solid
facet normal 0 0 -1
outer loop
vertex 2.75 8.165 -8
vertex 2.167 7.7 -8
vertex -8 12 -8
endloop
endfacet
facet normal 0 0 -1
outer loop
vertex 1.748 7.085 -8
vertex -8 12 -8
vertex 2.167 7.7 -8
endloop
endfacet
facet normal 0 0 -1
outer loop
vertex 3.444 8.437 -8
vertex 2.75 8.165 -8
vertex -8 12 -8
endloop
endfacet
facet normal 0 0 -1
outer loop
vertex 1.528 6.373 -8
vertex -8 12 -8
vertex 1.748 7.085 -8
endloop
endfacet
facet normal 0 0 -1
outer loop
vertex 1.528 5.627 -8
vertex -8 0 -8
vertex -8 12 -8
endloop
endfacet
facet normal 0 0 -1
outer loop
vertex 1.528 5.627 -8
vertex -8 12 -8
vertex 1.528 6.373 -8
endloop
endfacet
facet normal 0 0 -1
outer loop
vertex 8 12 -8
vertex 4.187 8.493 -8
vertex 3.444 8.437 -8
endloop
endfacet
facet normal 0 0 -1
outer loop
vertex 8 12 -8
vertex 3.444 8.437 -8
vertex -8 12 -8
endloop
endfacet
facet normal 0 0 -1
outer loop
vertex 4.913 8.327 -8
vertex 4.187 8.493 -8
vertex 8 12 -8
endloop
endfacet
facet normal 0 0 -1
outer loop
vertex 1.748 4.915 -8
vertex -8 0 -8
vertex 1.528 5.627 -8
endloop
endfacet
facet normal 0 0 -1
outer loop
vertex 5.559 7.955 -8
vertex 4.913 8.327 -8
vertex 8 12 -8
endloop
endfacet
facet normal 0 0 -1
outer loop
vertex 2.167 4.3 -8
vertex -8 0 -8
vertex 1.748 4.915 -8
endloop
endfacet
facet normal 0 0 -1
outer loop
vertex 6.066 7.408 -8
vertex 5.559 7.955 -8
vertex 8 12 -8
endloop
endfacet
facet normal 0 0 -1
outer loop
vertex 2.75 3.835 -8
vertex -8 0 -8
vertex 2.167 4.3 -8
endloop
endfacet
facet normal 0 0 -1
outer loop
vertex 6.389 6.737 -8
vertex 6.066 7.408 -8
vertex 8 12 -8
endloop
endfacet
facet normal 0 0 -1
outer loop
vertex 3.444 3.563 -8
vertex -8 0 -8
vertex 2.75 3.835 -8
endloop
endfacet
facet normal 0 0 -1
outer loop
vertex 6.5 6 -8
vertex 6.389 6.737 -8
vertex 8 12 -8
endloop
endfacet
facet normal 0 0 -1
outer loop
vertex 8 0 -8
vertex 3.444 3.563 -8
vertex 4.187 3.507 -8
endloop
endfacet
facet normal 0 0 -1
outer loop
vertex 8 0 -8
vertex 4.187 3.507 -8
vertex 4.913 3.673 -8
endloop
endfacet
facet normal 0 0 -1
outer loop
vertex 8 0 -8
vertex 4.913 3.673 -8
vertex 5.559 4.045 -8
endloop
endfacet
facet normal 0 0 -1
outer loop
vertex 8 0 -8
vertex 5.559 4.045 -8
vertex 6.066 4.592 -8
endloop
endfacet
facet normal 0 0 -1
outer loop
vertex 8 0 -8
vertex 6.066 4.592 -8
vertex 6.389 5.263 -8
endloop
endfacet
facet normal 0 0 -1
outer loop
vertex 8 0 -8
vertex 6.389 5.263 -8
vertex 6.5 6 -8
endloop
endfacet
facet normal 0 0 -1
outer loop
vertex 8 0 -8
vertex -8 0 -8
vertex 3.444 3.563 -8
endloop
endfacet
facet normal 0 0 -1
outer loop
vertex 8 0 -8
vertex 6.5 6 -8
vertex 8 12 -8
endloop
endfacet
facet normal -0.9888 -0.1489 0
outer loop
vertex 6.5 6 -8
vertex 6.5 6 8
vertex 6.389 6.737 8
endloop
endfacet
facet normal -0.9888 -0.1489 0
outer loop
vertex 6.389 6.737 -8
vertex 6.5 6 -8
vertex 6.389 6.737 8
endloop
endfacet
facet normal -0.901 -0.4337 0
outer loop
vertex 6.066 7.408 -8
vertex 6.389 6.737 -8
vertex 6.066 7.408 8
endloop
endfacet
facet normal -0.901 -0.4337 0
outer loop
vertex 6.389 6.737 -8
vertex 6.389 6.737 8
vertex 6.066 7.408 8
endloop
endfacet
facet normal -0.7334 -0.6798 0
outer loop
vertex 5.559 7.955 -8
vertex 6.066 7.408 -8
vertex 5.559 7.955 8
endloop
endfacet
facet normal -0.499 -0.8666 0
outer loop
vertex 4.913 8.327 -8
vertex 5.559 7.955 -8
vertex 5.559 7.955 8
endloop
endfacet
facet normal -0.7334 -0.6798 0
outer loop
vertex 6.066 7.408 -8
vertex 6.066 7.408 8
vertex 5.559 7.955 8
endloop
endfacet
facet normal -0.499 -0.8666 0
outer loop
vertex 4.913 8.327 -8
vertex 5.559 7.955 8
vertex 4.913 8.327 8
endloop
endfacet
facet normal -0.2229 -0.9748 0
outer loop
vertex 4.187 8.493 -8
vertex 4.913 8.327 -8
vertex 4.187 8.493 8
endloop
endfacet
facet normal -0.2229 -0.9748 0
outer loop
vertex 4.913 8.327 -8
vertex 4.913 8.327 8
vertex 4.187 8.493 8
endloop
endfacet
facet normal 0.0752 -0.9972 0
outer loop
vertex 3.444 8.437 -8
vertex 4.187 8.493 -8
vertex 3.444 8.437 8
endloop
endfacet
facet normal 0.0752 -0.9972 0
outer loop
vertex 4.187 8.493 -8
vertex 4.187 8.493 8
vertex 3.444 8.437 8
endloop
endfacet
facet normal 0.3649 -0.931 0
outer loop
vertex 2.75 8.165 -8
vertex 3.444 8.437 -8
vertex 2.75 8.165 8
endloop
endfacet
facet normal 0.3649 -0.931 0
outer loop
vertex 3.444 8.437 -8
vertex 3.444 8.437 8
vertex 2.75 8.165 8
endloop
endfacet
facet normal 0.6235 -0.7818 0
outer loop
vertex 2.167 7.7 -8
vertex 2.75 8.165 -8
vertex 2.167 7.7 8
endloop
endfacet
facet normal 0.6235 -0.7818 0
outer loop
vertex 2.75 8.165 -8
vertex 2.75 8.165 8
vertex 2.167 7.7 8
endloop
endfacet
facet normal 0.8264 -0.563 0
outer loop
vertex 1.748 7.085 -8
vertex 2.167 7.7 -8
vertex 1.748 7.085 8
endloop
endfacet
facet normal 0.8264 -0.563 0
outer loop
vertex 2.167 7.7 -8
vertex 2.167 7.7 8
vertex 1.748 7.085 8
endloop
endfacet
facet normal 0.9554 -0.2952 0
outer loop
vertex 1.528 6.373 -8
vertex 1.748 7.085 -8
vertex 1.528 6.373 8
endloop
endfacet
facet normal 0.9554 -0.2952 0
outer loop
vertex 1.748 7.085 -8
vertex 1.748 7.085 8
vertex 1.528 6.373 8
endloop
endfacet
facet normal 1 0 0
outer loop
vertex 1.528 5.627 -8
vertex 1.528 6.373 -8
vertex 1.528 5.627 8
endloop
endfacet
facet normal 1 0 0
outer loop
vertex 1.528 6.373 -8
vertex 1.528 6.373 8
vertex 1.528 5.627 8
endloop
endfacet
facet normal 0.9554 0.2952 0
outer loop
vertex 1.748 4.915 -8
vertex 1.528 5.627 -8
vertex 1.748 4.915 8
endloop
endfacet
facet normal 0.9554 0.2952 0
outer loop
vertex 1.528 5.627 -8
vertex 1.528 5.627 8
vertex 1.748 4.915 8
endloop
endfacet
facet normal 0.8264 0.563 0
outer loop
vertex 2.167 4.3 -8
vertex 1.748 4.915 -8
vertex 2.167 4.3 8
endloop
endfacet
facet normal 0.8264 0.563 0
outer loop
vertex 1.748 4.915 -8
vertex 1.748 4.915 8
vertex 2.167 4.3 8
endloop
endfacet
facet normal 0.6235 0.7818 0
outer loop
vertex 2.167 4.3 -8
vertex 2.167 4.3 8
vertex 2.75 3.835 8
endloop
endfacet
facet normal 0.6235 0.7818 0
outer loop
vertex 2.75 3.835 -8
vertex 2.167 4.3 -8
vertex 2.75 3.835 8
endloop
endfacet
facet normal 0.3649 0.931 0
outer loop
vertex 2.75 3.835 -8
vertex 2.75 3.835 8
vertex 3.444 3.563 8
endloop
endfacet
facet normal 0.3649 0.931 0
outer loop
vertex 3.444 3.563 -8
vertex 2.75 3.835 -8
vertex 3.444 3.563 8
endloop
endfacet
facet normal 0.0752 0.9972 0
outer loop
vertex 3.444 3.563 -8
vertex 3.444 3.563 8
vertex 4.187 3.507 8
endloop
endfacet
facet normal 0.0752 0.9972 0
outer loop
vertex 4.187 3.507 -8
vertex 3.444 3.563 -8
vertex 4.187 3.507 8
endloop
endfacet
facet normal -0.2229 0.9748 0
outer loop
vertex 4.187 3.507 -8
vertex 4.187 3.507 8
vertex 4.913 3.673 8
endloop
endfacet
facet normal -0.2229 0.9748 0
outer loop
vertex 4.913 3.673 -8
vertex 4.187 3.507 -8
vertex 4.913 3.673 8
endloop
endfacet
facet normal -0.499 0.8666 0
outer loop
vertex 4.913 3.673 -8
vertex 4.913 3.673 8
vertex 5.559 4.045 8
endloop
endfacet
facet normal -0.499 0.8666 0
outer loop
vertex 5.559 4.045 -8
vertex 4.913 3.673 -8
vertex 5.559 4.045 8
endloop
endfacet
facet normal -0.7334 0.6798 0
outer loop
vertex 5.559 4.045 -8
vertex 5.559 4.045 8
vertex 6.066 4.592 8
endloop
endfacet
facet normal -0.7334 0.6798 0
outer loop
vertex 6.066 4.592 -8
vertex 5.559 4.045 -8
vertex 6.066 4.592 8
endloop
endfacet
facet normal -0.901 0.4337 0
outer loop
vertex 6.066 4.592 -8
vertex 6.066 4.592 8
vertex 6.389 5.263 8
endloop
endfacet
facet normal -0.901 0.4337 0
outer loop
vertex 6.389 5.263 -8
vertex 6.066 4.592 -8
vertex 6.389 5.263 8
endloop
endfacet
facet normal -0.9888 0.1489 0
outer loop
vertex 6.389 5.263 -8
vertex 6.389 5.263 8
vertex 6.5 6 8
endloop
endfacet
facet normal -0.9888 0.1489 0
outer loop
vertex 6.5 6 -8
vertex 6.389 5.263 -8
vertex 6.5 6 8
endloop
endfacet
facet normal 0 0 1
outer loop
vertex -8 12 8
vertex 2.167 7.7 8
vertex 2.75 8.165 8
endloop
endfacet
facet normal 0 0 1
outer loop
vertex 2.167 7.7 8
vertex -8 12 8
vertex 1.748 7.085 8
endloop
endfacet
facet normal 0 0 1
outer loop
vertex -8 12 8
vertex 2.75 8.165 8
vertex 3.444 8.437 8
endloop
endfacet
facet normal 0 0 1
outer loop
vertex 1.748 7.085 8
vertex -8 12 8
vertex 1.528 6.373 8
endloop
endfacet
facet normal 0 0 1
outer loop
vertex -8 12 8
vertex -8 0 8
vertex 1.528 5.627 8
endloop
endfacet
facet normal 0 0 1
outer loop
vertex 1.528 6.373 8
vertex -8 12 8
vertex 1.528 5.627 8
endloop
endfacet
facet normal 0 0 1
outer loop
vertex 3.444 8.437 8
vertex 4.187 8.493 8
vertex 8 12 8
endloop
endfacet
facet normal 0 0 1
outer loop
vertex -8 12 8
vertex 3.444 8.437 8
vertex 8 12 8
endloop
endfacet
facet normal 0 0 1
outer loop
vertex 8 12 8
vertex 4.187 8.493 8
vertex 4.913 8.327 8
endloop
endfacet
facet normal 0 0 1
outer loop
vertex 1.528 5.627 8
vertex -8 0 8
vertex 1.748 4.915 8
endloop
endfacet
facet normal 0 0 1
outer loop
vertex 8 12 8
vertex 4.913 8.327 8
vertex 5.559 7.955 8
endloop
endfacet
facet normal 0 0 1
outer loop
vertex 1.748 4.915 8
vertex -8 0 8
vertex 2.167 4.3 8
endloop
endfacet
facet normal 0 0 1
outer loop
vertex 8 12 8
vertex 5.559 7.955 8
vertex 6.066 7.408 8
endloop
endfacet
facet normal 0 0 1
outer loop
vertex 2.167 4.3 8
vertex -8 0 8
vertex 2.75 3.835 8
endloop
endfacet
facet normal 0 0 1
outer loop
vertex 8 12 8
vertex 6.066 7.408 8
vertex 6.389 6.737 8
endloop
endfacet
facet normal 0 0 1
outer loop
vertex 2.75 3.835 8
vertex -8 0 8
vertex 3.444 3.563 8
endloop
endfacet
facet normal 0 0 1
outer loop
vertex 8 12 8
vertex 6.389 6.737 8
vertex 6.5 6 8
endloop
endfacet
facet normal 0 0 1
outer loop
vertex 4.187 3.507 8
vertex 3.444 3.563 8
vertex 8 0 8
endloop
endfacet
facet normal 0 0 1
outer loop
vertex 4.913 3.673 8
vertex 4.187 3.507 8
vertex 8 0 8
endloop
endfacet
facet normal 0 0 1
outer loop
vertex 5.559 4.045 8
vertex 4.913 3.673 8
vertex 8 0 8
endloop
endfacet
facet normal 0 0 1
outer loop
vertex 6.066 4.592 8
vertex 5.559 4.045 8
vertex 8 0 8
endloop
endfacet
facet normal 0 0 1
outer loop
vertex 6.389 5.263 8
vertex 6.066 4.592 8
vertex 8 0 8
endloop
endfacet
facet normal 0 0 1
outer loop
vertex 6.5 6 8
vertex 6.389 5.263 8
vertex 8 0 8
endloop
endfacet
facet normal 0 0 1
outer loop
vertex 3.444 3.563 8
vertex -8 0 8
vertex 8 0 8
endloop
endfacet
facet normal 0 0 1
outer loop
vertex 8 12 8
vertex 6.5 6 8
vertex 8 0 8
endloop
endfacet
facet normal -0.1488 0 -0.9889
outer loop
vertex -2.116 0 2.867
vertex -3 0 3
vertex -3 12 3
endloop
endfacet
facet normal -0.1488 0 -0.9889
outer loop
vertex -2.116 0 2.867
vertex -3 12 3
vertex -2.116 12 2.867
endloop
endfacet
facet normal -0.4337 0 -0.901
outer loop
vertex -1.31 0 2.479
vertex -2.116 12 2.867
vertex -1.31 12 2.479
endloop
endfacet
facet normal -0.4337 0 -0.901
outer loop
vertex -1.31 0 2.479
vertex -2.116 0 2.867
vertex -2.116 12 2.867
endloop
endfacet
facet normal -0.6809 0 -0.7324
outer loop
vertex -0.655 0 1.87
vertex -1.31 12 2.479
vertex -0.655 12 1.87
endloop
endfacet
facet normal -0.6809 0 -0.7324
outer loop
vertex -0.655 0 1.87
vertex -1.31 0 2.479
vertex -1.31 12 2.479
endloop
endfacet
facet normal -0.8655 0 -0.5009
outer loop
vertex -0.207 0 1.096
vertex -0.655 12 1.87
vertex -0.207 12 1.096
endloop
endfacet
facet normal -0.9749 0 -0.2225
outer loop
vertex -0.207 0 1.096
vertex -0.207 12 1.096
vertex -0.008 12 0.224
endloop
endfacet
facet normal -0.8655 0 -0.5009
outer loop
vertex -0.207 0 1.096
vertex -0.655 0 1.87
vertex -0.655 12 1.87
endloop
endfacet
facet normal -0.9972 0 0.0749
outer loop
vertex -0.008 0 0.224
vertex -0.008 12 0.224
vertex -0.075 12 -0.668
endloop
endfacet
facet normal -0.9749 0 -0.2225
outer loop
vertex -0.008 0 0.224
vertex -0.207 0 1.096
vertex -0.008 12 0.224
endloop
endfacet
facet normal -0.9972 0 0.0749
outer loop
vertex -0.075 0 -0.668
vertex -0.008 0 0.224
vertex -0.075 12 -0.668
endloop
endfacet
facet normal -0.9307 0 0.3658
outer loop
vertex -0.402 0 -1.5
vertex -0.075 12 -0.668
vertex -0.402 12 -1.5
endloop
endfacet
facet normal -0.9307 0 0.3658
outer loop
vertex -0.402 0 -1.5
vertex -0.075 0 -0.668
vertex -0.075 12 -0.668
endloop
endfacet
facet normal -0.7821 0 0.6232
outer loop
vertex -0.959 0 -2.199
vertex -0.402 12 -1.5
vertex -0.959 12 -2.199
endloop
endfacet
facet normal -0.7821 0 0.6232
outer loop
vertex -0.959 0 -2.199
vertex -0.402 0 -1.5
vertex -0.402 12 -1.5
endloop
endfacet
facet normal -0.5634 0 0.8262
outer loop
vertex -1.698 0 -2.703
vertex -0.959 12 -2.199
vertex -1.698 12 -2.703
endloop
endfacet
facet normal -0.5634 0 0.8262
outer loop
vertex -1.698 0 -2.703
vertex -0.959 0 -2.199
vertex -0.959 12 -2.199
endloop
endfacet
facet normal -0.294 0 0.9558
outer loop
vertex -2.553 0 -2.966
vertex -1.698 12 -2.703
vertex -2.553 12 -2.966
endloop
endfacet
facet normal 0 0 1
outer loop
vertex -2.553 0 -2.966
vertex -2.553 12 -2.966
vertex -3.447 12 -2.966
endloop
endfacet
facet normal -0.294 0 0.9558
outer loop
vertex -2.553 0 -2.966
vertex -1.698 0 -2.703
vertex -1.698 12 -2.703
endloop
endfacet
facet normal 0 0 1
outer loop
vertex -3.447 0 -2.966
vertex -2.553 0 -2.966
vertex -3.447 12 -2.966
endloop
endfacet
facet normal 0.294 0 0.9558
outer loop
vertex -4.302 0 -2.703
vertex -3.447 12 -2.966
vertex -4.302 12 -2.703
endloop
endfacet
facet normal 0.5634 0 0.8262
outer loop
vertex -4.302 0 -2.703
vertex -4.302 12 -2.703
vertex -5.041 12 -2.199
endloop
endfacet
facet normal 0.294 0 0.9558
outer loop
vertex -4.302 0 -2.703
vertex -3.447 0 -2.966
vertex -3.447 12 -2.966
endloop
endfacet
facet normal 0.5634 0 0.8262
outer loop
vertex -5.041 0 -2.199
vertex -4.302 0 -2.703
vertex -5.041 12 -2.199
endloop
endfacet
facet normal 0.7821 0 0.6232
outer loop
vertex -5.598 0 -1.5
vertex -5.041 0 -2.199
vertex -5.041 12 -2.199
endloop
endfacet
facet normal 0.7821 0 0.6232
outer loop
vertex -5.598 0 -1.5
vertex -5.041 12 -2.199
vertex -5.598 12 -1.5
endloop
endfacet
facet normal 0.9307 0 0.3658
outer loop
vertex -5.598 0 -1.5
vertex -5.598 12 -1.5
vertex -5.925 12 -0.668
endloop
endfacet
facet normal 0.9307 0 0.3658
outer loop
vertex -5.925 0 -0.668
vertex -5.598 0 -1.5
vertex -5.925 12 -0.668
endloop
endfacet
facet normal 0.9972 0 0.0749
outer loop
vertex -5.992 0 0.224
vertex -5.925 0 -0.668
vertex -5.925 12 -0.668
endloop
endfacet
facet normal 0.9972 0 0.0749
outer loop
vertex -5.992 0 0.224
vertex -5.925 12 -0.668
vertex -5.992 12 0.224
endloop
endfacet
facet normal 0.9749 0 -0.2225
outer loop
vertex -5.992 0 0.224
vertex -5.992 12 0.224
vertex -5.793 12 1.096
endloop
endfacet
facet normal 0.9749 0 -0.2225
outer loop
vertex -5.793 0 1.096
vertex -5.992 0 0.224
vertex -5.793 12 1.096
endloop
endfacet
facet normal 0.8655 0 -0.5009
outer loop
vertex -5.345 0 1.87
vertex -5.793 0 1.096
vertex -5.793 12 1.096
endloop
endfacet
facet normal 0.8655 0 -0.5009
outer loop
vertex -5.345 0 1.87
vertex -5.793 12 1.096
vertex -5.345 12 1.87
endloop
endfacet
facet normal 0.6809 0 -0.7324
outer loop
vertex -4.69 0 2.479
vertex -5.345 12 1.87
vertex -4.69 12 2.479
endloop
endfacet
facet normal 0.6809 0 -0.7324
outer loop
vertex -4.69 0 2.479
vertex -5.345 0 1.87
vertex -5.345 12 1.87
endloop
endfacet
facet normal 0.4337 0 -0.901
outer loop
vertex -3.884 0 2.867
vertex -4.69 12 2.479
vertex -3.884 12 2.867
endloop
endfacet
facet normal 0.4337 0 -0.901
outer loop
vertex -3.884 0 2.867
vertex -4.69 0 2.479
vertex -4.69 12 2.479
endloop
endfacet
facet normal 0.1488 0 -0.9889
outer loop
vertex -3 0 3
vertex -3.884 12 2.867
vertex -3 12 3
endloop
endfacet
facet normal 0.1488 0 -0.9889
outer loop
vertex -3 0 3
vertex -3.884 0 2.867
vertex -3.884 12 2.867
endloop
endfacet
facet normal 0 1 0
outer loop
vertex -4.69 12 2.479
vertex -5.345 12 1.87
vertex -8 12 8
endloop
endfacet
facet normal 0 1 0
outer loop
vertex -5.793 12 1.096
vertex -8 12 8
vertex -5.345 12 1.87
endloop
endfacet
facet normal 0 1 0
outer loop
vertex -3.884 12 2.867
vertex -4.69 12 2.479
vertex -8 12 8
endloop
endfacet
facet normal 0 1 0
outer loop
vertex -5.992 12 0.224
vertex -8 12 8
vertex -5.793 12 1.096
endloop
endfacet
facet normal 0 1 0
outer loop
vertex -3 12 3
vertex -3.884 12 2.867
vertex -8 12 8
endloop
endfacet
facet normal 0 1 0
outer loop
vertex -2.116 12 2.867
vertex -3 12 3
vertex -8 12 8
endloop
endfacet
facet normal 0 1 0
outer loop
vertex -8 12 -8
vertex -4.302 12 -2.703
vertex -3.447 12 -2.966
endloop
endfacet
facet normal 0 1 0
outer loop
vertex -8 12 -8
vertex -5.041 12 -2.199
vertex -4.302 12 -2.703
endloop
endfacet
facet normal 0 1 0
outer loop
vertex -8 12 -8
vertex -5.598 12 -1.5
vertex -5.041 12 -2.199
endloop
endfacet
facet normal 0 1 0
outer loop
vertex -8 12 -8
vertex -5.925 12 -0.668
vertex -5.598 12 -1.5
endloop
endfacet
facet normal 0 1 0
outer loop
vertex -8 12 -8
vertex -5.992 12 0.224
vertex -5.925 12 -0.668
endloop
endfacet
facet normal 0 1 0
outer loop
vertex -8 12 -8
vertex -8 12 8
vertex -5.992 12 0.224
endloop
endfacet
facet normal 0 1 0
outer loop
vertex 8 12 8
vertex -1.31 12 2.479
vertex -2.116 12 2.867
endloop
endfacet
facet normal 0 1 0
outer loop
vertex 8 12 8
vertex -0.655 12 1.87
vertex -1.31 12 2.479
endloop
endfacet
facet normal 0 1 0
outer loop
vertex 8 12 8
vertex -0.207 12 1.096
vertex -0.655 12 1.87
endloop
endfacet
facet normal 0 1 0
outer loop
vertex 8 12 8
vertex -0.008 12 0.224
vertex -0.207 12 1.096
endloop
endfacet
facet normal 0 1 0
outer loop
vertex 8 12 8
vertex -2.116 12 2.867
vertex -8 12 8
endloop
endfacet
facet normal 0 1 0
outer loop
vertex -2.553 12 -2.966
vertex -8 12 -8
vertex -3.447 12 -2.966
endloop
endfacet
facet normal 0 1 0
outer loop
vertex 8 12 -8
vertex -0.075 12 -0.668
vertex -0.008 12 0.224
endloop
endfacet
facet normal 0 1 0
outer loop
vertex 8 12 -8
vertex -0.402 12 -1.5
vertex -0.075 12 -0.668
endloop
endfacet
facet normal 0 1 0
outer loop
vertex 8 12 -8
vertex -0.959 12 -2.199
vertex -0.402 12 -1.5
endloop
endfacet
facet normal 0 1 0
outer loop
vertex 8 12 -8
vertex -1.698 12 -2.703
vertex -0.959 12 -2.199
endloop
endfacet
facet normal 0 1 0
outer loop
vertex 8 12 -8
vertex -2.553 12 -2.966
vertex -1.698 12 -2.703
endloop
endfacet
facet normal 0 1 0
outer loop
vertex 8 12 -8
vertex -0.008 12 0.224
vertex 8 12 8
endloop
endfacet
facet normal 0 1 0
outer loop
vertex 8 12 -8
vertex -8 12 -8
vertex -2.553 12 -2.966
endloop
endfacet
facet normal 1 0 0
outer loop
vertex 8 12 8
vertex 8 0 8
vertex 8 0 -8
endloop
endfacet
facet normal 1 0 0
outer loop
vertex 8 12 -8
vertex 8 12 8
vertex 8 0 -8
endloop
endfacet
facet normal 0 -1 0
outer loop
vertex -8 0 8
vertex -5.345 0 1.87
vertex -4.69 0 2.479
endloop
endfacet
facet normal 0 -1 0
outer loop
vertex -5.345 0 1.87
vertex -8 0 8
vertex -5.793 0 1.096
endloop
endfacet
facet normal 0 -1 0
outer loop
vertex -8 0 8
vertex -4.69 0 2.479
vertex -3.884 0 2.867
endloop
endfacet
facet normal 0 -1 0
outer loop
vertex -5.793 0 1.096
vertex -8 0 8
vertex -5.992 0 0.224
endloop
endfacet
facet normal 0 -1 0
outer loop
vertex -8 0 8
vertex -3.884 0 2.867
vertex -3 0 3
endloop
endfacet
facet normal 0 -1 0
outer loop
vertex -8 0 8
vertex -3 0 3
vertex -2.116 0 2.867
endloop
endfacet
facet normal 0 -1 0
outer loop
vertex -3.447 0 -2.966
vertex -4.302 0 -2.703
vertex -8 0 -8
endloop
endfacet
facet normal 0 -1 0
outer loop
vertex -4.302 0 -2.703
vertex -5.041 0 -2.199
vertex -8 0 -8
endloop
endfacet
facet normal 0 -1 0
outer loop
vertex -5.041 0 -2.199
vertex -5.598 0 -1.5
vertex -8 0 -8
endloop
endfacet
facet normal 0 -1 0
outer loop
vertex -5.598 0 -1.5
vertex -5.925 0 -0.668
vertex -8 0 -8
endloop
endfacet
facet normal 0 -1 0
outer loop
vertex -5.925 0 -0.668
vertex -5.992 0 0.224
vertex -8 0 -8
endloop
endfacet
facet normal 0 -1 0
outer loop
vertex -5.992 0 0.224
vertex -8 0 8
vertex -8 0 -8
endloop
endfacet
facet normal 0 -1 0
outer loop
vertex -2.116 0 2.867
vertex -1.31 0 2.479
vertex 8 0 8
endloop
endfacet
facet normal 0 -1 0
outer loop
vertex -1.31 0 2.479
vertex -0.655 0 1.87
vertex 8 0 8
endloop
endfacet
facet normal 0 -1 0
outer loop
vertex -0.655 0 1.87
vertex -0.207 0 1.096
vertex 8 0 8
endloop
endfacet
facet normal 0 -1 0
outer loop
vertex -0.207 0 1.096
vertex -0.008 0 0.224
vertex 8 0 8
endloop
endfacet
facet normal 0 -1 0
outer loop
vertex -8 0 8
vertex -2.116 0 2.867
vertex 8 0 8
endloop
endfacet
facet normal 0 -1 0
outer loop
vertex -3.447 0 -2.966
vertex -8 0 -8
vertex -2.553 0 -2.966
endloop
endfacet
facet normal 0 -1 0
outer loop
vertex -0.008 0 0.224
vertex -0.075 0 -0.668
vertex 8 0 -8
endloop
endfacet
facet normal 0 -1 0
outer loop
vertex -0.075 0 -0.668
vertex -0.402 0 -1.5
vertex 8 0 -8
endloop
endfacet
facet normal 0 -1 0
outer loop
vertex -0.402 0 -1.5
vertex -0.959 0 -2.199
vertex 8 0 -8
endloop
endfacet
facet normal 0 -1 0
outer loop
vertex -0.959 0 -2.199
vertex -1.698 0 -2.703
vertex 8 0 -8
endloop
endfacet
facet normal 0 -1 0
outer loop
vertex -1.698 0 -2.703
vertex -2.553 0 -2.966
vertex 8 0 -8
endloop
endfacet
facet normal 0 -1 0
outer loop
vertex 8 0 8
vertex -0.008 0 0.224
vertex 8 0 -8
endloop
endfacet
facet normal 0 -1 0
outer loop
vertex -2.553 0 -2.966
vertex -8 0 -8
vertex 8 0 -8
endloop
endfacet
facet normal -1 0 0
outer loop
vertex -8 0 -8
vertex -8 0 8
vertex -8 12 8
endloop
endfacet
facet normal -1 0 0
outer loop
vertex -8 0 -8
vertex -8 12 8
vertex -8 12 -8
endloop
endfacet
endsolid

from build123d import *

# Parameters (mm, degrees)
SKICA1_W                 = 16
SKICA1_H                 = 16
SKICA1_R                 = 3
P_IDAT_VYSUNUT_M1_DEPTH  = 12
SKICA2_R                 = 2.5
ODEBRAT_VYSUNUT_M1_DEPTH = 22


with BuildPart() as part:
    # Skica1 → Přidat vysunutím1 (new body)
    with BuildSketch(Plane(origin=(0, 0, 0), x_dir=(1, 0, 0), z_dir=(0, 1, 0))):
        Rectangle(SKICA1_W, SKICA1_H)
        with Locations(Location((-3, 0, 0), (0, 0, 270))):
            Circle(SKICA1_R, mode=Mode.SUBTRACT)
    extrude(amount=P_IDAT_VYSUNUT_M1_DEPTH)

    # Skica2 → Odebrat vysunutím1 (cut)
    with BuildSketch(Plane.XY.offset(8)):
        with Locations((4, 6)):
            Circle(SKICA2_R)
    extrude(amount=-ODEBRAT_VYSUNUT_M1_DEPTH, mode=Mode.SUBTRACT)


solid = part.part
